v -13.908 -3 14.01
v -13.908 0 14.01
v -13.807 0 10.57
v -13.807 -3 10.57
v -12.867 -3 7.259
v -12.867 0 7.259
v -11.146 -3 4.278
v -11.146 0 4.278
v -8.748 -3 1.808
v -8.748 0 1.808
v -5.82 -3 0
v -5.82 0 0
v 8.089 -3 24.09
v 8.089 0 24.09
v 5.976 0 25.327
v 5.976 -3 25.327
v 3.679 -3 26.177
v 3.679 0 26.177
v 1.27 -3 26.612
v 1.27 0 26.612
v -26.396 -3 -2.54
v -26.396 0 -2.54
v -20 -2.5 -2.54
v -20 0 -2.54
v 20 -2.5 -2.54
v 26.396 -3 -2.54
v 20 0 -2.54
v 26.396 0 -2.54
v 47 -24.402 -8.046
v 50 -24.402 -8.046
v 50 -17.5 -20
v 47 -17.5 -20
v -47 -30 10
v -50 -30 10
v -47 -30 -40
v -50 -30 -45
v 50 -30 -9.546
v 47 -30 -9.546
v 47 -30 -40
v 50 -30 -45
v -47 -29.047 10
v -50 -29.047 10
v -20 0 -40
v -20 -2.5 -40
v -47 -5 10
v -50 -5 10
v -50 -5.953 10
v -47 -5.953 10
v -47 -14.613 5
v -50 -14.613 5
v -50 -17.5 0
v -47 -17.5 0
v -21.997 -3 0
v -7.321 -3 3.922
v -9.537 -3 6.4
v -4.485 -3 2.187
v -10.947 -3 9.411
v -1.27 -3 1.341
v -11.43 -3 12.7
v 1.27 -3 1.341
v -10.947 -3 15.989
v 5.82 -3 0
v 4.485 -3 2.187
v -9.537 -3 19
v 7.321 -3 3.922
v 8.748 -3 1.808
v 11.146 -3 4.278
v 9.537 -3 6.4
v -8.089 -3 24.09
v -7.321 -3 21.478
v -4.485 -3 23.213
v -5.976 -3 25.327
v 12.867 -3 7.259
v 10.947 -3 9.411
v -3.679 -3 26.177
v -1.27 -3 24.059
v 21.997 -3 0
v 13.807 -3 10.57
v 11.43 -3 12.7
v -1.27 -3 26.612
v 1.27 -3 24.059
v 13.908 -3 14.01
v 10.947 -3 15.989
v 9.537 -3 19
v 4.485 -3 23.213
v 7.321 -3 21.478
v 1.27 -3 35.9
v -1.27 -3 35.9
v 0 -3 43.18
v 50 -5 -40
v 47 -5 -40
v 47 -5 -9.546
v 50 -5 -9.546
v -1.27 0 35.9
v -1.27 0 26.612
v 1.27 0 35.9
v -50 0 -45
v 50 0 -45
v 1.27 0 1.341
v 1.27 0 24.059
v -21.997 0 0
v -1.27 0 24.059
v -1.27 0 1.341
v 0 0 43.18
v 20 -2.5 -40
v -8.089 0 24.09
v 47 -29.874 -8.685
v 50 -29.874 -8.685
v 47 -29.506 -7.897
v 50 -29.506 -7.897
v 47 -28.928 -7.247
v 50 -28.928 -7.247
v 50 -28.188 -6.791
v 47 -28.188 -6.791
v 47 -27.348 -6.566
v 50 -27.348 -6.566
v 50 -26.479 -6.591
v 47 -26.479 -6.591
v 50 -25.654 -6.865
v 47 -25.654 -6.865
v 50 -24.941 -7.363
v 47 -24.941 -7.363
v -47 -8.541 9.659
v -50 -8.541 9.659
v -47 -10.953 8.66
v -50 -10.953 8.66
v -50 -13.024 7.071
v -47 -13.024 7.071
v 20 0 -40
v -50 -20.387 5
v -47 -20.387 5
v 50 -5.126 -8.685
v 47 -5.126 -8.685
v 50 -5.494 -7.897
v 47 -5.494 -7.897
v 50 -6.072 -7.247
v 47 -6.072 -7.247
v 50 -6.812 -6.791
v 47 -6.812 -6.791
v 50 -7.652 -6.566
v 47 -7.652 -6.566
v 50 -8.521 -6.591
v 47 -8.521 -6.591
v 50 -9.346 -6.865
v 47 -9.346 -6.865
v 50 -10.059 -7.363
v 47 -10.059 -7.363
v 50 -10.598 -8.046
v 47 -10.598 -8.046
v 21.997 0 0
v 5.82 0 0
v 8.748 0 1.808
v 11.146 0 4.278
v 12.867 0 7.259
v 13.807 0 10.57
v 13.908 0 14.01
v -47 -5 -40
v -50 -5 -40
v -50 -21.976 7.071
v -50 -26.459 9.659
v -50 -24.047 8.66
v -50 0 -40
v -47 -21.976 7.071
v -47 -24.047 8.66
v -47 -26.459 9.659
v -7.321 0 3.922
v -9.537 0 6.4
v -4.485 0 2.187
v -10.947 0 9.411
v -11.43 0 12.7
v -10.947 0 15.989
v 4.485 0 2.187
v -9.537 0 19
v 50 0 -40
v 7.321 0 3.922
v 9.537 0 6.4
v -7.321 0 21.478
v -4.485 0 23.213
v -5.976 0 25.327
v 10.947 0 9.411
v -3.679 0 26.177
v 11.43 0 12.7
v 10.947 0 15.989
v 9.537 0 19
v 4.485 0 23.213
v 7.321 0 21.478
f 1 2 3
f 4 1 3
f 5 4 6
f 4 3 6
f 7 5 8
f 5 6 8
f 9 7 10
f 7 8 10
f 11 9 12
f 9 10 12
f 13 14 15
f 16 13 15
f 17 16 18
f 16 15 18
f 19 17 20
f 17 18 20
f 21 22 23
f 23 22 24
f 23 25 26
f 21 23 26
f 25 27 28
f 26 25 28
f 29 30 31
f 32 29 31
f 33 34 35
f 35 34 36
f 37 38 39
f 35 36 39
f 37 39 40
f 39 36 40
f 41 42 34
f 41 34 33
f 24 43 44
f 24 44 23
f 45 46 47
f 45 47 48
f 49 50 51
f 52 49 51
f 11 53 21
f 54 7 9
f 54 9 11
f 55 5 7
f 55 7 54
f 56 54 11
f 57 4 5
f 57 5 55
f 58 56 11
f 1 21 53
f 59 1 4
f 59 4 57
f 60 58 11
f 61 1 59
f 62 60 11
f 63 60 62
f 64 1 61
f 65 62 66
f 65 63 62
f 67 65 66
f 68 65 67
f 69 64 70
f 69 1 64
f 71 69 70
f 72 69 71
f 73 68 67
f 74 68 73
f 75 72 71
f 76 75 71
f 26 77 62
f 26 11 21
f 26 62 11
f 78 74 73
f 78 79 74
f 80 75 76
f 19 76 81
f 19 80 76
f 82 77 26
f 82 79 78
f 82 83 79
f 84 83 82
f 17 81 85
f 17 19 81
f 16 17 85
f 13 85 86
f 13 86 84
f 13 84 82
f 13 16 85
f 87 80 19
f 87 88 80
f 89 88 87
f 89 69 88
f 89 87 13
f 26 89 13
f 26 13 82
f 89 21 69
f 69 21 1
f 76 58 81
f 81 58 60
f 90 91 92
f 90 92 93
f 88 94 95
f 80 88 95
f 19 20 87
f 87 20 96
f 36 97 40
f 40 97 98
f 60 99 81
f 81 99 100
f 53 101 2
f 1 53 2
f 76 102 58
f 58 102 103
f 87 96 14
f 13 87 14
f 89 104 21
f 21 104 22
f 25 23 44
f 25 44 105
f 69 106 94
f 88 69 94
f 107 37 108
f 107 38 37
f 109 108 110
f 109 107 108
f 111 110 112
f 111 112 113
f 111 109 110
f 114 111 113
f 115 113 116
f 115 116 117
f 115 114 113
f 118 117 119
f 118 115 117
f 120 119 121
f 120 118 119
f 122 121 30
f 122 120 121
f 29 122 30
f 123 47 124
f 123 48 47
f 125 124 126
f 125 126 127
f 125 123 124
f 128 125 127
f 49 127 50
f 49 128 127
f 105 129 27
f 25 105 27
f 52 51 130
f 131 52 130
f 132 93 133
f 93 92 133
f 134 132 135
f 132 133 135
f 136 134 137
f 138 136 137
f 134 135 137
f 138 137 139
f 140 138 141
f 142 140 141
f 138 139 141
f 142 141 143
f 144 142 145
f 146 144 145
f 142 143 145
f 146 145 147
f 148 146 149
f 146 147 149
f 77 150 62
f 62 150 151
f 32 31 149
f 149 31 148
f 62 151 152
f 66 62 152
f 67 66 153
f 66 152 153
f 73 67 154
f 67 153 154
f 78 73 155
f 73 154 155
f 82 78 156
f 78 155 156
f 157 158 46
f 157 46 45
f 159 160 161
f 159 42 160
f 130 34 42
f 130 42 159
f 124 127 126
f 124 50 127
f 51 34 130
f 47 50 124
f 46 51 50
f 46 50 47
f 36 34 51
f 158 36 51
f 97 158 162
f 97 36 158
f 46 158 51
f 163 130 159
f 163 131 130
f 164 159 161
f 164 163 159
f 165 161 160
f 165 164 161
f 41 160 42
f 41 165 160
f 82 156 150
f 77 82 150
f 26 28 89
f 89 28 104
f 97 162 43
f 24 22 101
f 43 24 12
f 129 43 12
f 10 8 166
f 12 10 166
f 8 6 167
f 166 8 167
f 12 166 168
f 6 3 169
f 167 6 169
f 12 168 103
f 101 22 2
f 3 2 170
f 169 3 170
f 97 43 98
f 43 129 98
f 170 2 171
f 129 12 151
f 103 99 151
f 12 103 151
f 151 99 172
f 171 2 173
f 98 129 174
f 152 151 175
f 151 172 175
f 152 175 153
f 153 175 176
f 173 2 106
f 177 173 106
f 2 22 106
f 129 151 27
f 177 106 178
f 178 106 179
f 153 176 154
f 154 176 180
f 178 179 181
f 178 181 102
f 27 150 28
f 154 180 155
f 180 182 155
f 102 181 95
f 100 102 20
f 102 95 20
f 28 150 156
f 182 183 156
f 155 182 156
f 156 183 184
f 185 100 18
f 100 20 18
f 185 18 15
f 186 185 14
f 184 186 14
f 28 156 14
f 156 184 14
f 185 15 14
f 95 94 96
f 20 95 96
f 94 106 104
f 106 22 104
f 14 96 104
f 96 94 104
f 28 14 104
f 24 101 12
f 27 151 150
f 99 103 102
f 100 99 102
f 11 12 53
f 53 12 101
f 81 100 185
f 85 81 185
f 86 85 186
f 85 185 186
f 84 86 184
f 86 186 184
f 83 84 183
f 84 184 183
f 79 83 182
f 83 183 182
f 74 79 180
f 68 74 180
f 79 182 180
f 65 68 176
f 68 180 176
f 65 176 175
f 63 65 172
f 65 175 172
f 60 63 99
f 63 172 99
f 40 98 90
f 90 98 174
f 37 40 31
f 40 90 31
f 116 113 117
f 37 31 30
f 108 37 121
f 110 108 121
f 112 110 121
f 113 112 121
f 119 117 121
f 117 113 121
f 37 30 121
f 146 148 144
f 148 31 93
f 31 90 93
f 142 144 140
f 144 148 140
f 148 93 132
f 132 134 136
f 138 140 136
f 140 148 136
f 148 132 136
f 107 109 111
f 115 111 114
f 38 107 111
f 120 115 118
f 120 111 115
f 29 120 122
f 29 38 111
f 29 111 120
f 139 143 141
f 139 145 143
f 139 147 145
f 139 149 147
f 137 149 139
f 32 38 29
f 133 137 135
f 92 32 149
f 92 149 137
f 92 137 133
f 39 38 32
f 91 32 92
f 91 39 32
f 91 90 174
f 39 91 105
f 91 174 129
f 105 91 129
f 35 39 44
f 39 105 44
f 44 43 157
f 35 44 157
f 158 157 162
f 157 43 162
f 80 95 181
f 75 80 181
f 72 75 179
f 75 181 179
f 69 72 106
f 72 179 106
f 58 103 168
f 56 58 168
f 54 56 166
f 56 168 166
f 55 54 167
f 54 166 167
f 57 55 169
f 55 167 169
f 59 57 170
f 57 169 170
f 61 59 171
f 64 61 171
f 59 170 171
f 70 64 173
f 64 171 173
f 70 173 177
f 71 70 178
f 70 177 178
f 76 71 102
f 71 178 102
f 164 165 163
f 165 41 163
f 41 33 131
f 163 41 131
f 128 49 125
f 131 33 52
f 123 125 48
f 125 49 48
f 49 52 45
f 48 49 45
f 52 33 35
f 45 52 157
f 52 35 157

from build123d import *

# Parameters (mm, degrees)
F1_DEPTH  = 3
F2_W      = 20
F2_H      = 40
F3_DEPTH  = 2.5
F5_DEPTH  = 30
F6_W      = 3
F6_H      = 25
F7_DEPTH  = 50
F9_DEPTH  = 25
F11_DEPTH = 10
F12_R     = 10
F13_R     = 3


with BuildPart() as f1:
    # F0 (on Front) → F1 (new body)
    with BuildSketch(Plane.XZ):
        Polygon((-26.3964543073, -2.54), (26.3964543073, -2.54), (0, 43.18), align=None)
        with BuildLine():
            Line((-5.8198711326, 0), (-21.9970452561, 0))
            Line((-21.9970452561, 0), (-13.9084581944, 14.0098437524))
            ThreePointArc((-13.9084581944, 14.0098437524), (-12.0983748909, 5.715), (-5.8198711326, 0))
        make_face(mode=Mode.SUBTRACT)
        with BuildLine():
            ThreePointArc((-1.27, 1.3407746743), (-11.43, 12.7), (-1.27, 24.0592253257))
            Line((-1.27, 24.0592253257), (-1.27, 1.3407746743))
        make_face(mode=Mode.SUBTRACT)
        with BuildLine():
            Line((13.9084581944, 14.0098437524), (21.9970452561, 0))
            Line((21.9970452561, 0), (5.8198711326, 0))
            ThreePointArc((5.8198711326, 0), (12.0983748909, 5.715), (13.9084581944, 14.0098437524))
        make_face(mode=Mode.SUBTRACT)
        with BuildLine():
            Line((1.27, 1.3407746743), (1.27, 24.0592253257))
            ThreePointArc((1.27, 24.0592253257), (11.43, 12.7), (1.27, 1.3407746743))
        make_face(mode=Mode.SUBTRACT)
        with BuildLine():
            Line((-8.0885870618, 24.0901562476), (-1.27, 35.9002954744))
            Line((-1.27, 35.9002954744), (-1.27, 26.6121529606))
            ThreePointArc((-1.27, 26.6121529606), (-4.8462258308, 25.8024804979), (-8.0885870618, 24.0901562476))
        make_face(mode=Mode.SUBTRACT)
        with BuildLine():
            Line((1.27, 26.6121529606), (1.27, 35.9002954744))
            Line((1.27, 35.9002954744), (8.0885870618, 24.0901562476))
            ThreePointArc((8.0885870618, 24.0901562476), (4.8462258308, 25.8024804979), (1.27, 26.6121529606))
        make_face(mode=Mode.SUBTRACT)
    extrude(amount=F1_DEPTH)

    # F2 (on Front) → F3 (join)
    with BuildSketch(Plane.XZ):
        with Locations((-10, -20)):
            Rectangle(F2_W, F2_H)
        with Locations((10, -20)):
            Rectangle(F2_W, F2_H)
    extrude(amount=F3_DEPTH)

    # F4 (on Front) → F5 (join)
    with BuildSketch(Plane.XZ):
        Polygon((20, -40), (-20, -40), (-50, -40), (-50, -45), (50, -45), (50, -40), align=None)
    extrude(amount=F5_DEPTH)

    # F6 (on face) → F7 (join)
    with BuildSketch(Plane.XY.offset(-40)):
        with Locations((-48.5, -17.5)):
            Rectangle(F6_W, F6_H)
        with Locations((48.5, -17.5)):
            Rectangle(F6_W, F6_H)
    extrude(amount=F7_DEPTH)

    # F8 (on face) → F9 (cut)
    with BuildSketch(Plane(origin=(-50, 0, 0), x_dir=(0, -1, 0), z_dir=(-1, 0, 0))):
        Polygon((23.2735026919, 10), (11.7264973081, 10), (17.5, 0), align=None)
    extrude(amount=-F9_DEPTH, mode=Mode.SUBTRACT)

    # F10 (on face) → F11 (cut)
    with BuildSketch(Plane.YZ.offset(50)):
        Polygon((-17.5, 10), (-34.8205080757, 10), (-17.5, -20), align=None)
        Polygon((-17.5, 10), (-17.5, -20), (-0.1794919243, 10), align=None)
    extrude(amount=-F11_DEPTH, mode=Mode.SUBTRACT)

    # F12
    f12_edges = [f1.edges().sort_by_distance(p)[0] for p in [
        (-48.5, -11.726497, 10),
        (-48.5, -23.273503, 10),
    ]]
    fillet(f12_edges, radius=F12_R)

    # F13
    f13_edges = [f1.edges().sort_by_distance(p)[0] for p in [
        (48.5, -30, 1.650635),
        (48.5, -5, 1.650635),
    ]]
    fillet(f13_edges, radius=F13_R)


solid = f1.part
